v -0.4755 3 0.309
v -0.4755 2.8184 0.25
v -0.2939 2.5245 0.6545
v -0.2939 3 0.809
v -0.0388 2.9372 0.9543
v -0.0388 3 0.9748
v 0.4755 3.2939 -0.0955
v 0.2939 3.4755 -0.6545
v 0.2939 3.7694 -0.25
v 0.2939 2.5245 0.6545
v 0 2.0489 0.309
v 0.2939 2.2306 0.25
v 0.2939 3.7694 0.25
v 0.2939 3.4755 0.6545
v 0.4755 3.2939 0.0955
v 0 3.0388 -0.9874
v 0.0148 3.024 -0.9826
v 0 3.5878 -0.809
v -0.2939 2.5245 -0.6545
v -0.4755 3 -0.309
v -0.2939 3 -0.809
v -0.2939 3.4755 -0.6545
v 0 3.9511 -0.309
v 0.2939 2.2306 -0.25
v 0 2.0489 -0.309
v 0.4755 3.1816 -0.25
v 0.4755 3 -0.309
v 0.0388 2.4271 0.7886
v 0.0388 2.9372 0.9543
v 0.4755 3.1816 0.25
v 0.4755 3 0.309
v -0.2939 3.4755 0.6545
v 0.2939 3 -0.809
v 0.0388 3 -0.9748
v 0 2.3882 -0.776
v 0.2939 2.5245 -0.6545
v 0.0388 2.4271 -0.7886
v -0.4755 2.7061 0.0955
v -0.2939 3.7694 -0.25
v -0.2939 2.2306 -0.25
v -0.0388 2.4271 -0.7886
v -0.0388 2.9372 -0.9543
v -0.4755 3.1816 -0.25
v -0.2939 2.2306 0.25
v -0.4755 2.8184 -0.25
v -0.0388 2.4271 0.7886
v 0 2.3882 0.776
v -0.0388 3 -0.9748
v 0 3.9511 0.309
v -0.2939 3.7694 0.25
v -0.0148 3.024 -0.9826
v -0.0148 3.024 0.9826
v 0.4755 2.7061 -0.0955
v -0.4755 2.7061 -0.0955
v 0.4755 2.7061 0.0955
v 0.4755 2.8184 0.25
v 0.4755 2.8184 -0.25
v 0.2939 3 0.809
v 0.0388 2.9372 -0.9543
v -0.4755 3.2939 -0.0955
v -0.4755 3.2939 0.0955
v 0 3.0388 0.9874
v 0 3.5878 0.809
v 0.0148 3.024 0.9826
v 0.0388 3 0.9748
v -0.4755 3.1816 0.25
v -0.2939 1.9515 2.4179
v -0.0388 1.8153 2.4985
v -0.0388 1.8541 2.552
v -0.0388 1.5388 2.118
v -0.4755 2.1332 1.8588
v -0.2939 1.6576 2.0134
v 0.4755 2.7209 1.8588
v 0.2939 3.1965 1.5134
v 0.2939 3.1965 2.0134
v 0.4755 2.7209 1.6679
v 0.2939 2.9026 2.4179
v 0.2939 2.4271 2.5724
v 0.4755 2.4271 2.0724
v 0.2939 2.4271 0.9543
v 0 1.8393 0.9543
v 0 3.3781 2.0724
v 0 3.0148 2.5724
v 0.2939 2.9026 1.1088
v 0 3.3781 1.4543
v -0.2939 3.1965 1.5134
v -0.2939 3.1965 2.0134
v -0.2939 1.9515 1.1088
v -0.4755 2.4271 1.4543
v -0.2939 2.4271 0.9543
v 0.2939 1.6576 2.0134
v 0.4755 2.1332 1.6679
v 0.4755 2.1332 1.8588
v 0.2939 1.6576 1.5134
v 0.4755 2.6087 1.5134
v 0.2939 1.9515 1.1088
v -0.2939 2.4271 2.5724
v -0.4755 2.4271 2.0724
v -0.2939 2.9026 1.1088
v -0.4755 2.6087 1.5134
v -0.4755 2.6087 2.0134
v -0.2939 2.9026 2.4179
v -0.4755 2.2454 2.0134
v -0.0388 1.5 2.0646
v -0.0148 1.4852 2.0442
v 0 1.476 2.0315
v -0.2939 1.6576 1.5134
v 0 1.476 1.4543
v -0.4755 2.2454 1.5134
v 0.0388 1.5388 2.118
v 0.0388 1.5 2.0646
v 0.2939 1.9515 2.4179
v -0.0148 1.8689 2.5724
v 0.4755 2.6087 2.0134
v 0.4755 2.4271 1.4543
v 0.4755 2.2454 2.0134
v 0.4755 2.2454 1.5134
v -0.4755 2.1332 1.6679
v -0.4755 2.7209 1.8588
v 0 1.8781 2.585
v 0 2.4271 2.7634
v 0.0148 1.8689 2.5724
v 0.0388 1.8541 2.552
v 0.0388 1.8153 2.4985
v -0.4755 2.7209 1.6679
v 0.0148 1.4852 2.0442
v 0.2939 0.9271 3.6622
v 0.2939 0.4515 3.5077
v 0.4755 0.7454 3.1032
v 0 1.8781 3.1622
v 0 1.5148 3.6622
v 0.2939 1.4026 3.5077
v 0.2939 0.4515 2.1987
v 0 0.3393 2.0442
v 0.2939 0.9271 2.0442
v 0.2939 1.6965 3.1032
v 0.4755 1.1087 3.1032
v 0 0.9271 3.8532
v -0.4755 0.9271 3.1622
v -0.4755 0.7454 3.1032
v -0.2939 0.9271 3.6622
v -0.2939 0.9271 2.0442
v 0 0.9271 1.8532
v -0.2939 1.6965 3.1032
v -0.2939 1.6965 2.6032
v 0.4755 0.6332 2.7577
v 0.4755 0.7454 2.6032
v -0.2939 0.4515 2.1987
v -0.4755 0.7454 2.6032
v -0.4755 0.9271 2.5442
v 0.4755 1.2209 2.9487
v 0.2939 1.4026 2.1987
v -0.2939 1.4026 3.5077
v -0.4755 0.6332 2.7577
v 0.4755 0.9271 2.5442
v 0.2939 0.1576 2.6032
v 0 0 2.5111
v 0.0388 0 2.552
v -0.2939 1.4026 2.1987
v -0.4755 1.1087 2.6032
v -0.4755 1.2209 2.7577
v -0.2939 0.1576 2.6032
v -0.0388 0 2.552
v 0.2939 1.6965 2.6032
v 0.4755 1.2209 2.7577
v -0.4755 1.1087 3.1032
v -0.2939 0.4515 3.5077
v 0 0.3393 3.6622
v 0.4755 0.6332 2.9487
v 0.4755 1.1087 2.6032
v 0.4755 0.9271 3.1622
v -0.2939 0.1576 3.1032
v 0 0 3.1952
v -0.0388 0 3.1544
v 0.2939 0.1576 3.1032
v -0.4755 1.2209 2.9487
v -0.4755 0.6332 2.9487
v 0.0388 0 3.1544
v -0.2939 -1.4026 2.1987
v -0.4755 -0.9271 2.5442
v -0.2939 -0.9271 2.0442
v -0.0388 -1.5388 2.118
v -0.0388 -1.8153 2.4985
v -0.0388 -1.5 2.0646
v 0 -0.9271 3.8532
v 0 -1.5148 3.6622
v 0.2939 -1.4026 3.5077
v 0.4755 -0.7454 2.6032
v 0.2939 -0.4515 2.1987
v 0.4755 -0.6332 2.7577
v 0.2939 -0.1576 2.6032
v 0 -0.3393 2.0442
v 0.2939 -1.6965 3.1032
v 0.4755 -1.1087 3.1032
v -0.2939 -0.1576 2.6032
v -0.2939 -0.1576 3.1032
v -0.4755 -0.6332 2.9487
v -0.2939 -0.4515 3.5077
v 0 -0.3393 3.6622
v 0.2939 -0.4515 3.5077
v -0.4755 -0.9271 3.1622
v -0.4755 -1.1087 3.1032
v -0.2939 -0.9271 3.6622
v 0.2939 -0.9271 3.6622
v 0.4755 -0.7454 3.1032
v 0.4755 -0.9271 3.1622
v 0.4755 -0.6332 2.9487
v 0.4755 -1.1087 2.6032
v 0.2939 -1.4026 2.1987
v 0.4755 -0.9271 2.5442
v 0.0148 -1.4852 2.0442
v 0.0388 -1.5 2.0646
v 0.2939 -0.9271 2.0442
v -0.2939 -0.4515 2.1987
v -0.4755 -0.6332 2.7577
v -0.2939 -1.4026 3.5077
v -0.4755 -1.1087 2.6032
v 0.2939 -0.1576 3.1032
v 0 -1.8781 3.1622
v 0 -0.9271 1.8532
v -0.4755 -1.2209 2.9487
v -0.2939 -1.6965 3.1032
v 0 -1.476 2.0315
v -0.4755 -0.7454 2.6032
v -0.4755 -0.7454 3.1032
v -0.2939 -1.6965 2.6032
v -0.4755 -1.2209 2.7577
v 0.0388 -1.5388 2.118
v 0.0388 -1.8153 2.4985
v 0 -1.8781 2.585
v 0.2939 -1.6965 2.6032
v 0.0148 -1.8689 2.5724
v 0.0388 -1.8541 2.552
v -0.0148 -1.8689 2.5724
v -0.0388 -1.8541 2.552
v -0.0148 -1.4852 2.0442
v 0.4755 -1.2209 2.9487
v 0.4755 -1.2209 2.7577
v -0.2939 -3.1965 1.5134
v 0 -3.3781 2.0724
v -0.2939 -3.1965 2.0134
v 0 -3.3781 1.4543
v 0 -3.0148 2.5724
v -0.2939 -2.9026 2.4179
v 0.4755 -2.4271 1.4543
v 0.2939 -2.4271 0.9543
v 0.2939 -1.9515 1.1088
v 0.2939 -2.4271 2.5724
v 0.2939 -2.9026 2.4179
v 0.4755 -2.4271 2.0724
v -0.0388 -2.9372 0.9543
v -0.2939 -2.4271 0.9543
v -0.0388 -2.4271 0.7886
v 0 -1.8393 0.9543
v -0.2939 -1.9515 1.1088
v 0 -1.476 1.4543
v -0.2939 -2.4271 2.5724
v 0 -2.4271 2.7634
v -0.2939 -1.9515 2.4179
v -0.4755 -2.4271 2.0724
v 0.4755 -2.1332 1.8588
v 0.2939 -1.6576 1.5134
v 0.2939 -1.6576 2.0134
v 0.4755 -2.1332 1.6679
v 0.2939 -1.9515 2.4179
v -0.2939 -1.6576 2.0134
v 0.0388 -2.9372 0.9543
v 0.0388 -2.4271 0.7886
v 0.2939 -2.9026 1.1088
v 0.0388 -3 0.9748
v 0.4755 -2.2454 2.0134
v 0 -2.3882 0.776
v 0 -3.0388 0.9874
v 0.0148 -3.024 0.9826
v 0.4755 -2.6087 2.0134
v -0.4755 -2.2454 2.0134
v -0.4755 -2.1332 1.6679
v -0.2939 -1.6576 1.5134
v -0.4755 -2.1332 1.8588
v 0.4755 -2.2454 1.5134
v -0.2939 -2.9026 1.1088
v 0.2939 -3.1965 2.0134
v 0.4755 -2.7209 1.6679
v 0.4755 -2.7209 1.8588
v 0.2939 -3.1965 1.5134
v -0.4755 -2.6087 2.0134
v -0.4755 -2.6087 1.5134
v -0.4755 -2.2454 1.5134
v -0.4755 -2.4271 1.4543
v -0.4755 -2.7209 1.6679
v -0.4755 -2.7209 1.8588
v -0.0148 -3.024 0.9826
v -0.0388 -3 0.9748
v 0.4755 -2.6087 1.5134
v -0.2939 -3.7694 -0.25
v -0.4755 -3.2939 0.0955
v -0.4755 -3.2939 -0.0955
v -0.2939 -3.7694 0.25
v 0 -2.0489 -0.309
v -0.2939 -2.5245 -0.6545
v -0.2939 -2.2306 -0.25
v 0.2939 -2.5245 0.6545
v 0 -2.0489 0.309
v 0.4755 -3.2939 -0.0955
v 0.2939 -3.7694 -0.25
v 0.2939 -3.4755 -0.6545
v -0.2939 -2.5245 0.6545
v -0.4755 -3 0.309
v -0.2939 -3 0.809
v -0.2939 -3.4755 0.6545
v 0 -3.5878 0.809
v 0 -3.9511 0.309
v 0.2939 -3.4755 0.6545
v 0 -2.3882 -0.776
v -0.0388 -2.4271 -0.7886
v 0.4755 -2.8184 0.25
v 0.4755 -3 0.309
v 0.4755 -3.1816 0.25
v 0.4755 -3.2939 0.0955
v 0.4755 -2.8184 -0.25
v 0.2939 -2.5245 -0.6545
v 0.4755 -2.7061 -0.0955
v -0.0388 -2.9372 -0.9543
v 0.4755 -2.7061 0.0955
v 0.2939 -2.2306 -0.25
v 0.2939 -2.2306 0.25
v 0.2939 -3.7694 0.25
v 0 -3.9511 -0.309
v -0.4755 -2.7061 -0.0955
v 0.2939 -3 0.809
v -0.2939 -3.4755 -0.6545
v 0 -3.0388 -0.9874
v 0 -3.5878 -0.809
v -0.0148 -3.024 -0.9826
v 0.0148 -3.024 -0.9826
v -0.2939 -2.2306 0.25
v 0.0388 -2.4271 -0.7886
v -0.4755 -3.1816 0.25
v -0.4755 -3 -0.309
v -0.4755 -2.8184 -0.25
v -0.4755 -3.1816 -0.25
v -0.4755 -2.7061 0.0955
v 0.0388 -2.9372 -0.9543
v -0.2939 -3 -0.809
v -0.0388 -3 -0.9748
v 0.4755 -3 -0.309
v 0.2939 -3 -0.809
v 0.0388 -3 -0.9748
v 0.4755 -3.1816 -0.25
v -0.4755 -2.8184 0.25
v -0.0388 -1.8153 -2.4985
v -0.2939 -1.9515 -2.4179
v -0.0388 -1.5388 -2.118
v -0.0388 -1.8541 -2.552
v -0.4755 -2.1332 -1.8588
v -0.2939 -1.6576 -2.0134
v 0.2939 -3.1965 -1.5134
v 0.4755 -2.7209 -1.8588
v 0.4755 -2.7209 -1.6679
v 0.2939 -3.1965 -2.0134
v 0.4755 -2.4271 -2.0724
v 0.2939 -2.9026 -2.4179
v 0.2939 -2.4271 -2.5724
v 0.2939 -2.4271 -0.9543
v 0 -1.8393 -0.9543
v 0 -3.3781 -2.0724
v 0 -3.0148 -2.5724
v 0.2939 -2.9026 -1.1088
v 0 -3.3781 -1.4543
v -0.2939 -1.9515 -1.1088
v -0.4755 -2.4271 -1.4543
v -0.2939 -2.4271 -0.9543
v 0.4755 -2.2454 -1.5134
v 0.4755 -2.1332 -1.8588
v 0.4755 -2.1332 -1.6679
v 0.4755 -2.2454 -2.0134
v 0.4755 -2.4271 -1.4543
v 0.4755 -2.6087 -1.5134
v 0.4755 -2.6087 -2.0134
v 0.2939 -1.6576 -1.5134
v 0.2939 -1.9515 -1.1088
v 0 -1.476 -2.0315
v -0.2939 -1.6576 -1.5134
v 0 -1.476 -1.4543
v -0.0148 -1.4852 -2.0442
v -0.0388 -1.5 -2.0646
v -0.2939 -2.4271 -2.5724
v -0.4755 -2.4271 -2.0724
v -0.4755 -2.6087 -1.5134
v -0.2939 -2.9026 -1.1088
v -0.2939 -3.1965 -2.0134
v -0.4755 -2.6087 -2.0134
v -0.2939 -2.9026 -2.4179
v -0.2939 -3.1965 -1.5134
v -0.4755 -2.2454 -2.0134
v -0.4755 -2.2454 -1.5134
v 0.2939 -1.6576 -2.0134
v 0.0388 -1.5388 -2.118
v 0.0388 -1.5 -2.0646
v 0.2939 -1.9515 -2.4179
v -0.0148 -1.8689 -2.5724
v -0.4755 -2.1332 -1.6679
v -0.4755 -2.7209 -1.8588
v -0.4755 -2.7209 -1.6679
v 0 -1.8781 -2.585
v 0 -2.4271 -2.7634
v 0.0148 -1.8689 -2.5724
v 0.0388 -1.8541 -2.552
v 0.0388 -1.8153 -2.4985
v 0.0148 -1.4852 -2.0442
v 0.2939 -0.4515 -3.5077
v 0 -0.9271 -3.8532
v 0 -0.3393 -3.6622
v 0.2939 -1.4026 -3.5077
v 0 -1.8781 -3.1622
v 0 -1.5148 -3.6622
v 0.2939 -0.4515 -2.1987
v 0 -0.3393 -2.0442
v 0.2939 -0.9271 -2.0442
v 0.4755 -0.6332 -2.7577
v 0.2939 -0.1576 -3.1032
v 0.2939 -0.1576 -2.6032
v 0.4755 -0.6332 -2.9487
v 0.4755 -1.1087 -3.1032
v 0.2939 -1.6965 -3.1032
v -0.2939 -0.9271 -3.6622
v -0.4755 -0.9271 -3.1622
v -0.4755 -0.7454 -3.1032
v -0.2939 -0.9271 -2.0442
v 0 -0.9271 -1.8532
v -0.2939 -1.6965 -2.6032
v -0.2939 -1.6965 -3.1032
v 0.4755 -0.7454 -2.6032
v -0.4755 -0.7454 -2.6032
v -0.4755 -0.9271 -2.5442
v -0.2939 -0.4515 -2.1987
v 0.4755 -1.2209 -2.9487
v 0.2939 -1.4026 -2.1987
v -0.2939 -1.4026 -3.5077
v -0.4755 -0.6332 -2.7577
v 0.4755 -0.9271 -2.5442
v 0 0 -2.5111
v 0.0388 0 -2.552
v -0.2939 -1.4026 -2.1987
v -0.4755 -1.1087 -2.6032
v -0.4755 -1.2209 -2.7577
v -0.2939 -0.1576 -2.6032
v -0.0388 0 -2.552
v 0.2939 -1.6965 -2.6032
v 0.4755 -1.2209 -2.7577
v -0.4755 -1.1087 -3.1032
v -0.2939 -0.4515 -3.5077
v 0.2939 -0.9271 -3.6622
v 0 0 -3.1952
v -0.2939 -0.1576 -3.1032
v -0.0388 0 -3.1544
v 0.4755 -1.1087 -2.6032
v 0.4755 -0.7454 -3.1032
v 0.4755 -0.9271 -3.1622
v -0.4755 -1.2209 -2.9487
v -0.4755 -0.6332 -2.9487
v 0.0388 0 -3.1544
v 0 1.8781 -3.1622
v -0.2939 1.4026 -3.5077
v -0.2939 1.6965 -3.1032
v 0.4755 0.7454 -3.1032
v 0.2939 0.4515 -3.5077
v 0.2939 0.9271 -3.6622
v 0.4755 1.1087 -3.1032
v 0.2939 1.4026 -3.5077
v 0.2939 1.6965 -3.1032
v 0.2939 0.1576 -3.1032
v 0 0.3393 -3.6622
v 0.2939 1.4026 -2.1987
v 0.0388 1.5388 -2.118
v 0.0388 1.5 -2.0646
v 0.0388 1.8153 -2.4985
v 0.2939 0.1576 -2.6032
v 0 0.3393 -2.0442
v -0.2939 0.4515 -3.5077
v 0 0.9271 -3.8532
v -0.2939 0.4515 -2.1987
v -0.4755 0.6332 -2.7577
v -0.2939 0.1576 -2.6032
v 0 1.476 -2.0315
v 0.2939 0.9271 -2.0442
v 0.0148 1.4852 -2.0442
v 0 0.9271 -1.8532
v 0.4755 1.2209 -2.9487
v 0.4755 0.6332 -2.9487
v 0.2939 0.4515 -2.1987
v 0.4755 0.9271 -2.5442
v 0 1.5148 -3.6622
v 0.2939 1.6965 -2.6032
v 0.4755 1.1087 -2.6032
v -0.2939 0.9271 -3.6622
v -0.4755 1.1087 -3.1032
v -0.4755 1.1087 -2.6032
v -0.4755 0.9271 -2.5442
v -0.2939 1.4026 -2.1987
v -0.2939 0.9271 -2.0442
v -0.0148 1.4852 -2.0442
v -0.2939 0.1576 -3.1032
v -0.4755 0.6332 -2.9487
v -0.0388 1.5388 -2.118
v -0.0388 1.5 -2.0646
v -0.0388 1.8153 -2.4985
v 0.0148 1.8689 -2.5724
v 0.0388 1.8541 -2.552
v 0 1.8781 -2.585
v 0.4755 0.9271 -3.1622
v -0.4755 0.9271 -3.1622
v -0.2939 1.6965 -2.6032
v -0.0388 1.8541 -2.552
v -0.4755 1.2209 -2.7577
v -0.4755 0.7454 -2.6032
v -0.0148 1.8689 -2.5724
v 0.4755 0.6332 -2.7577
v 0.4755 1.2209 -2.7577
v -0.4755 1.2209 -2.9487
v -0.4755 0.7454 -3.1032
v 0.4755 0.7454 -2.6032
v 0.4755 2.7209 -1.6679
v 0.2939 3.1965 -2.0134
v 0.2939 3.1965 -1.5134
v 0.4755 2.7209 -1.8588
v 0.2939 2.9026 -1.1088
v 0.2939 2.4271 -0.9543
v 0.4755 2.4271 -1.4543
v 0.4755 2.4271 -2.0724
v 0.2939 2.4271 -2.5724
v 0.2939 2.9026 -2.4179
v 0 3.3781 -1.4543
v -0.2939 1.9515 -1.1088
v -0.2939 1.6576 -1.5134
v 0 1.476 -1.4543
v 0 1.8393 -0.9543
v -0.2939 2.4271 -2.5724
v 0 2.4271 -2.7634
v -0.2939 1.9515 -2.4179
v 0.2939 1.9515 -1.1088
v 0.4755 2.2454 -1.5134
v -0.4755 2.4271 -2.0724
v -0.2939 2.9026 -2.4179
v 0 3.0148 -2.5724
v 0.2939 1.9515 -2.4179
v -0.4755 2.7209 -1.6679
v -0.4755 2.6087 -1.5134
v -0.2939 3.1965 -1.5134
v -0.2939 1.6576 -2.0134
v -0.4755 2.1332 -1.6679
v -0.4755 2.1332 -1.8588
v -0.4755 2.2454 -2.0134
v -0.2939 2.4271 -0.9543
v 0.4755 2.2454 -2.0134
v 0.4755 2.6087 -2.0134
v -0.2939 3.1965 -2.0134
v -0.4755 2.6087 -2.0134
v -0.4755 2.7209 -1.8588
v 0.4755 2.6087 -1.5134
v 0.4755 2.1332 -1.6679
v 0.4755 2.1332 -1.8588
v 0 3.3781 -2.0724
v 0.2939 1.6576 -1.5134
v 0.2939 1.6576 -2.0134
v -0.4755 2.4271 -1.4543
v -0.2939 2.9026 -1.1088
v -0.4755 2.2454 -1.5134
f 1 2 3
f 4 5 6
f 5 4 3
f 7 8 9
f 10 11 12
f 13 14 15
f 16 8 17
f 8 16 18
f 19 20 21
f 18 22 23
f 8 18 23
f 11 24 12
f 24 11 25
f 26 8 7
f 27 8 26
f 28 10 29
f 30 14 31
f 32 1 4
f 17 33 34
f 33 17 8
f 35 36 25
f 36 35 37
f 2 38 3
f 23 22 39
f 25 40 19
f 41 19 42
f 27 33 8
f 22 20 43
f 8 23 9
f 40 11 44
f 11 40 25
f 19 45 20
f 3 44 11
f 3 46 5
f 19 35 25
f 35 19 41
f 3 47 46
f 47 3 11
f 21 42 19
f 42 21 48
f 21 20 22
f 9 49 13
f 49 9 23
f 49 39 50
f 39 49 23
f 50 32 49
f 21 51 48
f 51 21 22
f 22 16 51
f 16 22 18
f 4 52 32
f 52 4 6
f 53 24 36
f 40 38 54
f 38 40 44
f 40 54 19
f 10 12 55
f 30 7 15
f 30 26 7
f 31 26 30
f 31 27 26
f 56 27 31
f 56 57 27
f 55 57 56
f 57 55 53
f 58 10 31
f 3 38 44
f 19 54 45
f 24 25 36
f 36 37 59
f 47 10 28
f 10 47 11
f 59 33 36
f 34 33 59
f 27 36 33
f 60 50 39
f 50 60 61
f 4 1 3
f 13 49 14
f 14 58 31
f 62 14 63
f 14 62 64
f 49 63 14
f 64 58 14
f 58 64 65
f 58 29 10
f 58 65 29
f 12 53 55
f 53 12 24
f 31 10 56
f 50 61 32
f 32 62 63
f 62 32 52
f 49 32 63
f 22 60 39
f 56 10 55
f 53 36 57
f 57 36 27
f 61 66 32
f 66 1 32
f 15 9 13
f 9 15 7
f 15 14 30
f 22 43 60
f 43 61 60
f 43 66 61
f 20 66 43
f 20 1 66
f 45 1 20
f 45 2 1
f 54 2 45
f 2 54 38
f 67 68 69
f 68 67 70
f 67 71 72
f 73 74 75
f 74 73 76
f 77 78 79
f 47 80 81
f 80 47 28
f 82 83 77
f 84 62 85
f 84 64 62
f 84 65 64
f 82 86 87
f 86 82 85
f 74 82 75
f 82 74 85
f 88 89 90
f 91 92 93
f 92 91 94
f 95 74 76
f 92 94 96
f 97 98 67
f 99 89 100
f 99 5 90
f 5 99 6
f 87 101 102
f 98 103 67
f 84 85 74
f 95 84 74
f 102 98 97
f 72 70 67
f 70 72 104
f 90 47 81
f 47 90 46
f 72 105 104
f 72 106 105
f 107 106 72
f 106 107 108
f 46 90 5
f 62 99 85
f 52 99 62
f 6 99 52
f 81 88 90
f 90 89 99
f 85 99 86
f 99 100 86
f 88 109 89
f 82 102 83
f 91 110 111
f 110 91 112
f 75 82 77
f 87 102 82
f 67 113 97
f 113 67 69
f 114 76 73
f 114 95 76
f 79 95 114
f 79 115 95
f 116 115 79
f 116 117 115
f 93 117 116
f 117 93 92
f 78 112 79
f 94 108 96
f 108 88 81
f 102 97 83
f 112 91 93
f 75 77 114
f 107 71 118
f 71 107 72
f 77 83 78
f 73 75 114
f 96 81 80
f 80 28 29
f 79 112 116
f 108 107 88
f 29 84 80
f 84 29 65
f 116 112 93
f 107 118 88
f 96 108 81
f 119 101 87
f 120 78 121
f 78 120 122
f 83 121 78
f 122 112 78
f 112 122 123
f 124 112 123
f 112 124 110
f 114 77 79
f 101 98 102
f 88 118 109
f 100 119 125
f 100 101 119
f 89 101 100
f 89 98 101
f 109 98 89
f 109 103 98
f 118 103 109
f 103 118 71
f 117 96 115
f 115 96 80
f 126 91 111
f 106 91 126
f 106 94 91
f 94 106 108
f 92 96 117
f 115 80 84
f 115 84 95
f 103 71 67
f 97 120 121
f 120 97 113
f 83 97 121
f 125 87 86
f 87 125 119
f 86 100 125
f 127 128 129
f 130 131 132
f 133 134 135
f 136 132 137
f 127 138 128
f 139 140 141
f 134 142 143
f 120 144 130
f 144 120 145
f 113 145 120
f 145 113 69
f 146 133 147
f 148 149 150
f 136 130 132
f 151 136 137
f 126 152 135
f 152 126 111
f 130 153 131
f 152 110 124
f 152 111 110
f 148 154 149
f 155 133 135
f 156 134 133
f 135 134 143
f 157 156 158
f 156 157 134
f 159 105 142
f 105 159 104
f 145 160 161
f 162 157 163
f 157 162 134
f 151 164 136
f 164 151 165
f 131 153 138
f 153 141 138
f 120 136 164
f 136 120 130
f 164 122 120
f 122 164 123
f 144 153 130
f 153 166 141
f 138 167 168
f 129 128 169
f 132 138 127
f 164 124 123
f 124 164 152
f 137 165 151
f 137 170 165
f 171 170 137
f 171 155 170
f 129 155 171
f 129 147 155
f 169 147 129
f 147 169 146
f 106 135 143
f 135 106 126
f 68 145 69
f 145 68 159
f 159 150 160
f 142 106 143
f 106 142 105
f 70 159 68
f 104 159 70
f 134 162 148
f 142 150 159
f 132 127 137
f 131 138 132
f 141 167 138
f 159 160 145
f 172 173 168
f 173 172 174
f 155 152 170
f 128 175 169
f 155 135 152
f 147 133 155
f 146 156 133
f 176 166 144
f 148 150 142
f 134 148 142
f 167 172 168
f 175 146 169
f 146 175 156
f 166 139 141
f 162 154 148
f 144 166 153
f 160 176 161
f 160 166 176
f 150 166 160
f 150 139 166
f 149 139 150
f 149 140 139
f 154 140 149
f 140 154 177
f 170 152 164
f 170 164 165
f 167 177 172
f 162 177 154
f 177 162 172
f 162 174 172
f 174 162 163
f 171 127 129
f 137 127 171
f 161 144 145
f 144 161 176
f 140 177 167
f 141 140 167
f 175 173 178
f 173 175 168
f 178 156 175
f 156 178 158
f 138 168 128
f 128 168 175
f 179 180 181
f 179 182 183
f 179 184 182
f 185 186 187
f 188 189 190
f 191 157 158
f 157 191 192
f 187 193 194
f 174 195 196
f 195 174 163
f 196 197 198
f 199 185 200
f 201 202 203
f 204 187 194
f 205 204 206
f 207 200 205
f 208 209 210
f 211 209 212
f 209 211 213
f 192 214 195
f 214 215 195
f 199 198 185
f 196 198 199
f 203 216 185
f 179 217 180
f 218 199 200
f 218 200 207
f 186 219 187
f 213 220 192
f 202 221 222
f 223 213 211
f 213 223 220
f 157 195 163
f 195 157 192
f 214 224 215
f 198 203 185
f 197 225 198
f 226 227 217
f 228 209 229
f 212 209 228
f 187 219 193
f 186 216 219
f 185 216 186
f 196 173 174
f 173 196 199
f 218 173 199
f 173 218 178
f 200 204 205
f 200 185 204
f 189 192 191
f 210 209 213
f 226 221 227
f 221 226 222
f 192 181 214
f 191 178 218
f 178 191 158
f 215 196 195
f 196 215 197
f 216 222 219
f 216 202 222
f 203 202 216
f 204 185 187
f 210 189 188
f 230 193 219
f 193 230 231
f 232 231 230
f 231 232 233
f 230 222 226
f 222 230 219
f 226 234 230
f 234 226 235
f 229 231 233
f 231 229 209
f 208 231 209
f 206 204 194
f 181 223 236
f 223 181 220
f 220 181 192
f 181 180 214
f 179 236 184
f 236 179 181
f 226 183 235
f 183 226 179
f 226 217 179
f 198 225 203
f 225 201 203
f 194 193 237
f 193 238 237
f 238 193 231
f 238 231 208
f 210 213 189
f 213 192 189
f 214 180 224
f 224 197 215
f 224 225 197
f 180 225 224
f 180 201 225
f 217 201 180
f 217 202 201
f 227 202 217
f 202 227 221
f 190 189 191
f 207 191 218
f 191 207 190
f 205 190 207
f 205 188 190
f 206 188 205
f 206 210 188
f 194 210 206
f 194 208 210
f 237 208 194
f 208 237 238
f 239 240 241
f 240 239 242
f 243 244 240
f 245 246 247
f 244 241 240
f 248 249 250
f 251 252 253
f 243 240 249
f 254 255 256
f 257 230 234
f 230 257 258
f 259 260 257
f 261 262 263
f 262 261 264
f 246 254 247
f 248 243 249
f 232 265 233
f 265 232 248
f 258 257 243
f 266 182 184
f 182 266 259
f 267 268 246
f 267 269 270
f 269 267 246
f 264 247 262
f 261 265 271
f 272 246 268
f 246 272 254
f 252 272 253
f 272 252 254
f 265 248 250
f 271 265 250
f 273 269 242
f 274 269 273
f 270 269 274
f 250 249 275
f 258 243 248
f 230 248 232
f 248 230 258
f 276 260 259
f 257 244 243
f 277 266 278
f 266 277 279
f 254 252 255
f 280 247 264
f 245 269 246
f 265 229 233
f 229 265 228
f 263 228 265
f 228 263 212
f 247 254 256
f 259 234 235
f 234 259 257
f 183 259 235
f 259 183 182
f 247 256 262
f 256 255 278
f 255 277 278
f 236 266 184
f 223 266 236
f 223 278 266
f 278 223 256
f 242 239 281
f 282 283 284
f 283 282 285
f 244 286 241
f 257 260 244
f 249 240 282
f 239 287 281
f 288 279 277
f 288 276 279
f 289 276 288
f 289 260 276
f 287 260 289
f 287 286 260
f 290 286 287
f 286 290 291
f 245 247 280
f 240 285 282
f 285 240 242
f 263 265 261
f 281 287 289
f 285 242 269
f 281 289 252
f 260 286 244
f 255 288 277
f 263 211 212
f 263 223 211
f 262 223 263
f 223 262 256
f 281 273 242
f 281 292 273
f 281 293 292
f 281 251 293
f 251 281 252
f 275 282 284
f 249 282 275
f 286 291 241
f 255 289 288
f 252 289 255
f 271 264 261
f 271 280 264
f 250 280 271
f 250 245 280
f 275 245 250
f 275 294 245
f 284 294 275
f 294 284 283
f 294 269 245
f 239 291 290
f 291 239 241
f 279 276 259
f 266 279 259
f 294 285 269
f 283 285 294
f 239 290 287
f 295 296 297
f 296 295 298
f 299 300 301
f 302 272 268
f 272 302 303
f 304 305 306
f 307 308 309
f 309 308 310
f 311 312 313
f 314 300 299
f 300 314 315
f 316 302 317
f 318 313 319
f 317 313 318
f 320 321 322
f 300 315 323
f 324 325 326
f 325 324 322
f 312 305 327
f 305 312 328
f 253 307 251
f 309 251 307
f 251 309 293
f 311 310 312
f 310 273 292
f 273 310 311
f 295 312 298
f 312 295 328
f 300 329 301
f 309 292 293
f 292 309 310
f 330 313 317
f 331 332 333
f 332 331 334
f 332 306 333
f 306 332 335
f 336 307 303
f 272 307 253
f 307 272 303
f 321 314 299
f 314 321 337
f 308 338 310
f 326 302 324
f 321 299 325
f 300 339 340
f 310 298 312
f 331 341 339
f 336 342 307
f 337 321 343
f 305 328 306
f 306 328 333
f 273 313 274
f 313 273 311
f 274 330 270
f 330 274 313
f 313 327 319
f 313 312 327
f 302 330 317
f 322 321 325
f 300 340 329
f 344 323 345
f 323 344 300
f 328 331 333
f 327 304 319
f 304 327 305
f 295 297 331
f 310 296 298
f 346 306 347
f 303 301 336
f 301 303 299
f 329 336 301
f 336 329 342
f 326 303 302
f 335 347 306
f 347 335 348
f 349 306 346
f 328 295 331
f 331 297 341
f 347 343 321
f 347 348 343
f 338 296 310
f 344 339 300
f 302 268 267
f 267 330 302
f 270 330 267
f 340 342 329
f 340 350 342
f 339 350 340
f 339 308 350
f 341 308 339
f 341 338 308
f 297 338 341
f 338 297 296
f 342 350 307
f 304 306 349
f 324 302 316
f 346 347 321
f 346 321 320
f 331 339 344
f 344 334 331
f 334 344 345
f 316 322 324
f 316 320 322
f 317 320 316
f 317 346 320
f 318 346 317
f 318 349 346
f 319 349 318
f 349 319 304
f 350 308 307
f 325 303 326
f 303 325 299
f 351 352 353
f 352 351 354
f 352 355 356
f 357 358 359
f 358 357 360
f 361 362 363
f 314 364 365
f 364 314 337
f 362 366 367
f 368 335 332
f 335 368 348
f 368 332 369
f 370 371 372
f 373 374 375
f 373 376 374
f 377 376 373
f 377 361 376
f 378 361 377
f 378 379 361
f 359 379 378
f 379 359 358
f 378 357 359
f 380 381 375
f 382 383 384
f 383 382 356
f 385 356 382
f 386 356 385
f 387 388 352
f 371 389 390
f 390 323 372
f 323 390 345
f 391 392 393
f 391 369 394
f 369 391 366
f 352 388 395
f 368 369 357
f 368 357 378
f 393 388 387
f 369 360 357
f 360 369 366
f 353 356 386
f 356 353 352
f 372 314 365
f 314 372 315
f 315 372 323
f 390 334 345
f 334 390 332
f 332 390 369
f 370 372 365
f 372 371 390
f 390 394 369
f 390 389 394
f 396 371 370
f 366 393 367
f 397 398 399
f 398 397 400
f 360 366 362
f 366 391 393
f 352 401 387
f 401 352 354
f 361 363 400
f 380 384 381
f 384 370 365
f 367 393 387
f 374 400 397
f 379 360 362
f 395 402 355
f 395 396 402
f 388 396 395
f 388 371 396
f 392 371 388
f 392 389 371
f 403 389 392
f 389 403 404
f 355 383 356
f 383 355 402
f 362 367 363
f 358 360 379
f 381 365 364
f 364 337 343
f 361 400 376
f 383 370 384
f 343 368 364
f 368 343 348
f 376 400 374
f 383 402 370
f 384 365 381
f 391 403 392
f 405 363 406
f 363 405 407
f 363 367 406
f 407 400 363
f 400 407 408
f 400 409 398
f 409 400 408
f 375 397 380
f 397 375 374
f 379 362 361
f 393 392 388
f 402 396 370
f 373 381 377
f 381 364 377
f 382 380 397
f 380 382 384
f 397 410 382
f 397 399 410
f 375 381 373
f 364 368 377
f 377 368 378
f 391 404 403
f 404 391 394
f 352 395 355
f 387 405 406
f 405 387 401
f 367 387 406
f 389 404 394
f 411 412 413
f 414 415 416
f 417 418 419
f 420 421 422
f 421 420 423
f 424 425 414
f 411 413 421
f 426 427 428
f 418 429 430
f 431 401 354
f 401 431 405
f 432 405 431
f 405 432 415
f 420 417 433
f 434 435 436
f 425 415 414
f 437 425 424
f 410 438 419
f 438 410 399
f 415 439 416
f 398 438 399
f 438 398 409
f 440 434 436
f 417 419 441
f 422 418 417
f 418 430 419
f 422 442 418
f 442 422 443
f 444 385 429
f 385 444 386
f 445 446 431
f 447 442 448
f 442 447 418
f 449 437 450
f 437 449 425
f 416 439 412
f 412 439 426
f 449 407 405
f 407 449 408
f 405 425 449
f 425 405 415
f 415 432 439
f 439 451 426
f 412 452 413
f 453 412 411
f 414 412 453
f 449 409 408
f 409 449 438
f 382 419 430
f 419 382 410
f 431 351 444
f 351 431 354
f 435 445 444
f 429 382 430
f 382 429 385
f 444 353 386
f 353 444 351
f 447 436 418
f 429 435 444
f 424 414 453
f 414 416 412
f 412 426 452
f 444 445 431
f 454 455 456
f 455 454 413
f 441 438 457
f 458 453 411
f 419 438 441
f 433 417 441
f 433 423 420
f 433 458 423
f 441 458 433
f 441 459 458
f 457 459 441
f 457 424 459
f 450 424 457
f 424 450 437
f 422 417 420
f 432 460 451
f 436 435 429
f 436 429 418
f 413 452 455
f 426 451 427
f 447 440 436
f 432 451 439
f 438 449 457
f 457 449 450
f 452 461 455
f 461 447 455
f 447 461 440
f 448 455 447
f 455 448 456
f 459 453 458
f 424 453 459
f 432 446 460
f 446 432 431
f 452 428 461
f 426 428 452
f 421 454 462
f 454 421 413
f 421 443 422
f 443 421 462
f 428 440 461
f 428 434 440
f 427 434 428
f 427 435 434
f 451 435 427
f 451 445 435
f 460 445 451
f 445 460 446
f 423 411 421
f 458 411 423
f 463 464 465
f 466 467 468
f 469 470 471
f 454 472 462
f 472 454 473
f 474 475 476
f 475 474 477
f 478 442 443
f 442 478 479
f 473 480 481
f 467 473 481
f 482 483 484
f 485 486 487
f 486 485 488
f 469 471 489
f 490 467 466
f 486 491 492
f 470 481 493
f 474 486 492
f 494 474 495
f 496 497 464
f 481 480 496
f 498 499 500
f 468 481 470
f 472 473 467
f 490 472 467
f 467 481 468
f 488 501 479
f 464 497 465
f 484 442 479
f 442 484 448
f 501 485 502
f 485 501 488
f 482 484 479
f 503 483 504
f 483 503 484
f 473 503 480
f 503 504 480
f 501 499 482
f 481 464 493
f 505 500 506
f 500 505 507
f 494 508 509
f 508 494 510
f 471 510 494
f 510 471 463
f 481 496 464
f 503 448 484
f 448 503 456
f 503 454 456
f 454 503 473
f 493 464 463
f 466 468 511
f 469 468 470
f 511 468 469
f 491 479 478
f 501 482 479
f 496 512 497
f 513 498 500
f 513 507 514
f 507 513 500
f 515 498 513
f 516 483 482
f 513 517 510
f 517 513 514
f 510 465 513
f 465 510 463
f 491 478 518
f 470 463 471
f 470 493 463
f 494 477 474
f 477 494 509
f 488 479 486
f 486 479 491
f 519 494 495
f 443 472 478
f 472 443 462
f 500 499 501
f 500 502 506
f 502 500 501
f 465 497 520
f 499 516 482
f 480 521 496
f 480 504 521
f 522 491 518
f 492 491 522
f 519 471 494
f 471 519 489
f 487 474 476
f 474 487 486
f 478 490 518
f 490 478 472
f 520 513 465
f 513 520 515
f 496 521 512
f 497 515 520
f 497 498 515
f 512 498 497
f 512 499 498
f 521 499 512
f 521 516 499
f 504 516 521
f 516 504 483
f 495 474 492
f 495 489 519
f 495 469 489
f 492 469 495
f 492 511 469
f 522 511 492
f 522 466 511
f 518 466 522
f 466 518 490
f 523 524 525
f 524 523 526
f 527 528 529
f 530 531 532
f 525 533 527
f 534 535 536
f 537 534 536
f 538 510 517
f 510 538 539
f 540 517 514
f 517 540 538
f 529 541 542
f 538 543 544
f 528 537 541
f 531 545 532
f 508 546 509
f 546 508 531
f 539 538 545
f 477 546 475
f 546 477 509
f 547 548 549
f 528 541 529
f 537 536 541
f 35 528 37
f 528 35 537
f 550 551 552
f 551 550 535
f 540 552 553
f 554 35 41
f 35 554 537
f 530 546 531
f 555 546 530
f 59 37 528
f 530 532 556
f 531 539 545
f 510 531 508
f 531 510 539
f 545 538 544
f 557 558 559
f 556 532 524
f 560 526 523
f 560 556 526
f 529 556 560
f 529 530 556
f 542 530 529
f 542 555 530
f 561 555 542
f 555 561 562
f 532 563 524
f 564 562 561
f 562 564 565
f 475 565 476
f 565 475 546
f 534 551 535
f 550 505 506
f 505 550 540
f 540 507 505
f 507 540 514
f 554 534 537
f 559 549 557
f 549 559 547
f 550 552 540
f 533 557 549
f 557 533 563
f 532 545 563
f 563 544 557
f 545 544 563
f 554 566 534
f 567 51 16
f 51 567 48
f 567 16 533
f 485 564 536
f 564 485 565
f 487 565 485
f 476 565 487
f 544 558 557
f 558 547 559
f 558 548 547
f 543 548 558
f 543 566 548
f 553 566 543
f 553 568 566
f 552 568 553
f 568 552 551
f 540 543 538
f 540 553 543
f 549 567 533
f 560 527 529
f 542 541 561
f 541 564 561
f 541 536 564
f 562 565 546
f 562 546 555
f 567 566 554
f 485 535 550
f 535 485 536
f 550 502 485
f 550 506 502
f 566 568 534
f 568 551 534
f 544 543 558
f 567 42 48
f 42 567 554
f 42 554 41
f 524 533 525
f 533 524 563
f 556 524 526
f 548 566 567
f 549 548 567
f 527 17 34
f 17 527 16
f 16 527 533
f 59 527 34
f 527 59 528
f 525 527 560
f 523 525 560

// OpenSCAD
//$fa=0.5; // default minimum facet angle is now 0.5
//$fs=0.5; // default minimum facet size is now 0.5 mm

union (){
for ( i = [0:9] ) { rotate( i*360/10, [1, 0, 0]) translate( [0, 3, 0] ) rotate ([0, 90, 0]) scale([1, 1, 0.5]) sphere(r = 1, $fn=10); }
}


 echo("Version:",version());
